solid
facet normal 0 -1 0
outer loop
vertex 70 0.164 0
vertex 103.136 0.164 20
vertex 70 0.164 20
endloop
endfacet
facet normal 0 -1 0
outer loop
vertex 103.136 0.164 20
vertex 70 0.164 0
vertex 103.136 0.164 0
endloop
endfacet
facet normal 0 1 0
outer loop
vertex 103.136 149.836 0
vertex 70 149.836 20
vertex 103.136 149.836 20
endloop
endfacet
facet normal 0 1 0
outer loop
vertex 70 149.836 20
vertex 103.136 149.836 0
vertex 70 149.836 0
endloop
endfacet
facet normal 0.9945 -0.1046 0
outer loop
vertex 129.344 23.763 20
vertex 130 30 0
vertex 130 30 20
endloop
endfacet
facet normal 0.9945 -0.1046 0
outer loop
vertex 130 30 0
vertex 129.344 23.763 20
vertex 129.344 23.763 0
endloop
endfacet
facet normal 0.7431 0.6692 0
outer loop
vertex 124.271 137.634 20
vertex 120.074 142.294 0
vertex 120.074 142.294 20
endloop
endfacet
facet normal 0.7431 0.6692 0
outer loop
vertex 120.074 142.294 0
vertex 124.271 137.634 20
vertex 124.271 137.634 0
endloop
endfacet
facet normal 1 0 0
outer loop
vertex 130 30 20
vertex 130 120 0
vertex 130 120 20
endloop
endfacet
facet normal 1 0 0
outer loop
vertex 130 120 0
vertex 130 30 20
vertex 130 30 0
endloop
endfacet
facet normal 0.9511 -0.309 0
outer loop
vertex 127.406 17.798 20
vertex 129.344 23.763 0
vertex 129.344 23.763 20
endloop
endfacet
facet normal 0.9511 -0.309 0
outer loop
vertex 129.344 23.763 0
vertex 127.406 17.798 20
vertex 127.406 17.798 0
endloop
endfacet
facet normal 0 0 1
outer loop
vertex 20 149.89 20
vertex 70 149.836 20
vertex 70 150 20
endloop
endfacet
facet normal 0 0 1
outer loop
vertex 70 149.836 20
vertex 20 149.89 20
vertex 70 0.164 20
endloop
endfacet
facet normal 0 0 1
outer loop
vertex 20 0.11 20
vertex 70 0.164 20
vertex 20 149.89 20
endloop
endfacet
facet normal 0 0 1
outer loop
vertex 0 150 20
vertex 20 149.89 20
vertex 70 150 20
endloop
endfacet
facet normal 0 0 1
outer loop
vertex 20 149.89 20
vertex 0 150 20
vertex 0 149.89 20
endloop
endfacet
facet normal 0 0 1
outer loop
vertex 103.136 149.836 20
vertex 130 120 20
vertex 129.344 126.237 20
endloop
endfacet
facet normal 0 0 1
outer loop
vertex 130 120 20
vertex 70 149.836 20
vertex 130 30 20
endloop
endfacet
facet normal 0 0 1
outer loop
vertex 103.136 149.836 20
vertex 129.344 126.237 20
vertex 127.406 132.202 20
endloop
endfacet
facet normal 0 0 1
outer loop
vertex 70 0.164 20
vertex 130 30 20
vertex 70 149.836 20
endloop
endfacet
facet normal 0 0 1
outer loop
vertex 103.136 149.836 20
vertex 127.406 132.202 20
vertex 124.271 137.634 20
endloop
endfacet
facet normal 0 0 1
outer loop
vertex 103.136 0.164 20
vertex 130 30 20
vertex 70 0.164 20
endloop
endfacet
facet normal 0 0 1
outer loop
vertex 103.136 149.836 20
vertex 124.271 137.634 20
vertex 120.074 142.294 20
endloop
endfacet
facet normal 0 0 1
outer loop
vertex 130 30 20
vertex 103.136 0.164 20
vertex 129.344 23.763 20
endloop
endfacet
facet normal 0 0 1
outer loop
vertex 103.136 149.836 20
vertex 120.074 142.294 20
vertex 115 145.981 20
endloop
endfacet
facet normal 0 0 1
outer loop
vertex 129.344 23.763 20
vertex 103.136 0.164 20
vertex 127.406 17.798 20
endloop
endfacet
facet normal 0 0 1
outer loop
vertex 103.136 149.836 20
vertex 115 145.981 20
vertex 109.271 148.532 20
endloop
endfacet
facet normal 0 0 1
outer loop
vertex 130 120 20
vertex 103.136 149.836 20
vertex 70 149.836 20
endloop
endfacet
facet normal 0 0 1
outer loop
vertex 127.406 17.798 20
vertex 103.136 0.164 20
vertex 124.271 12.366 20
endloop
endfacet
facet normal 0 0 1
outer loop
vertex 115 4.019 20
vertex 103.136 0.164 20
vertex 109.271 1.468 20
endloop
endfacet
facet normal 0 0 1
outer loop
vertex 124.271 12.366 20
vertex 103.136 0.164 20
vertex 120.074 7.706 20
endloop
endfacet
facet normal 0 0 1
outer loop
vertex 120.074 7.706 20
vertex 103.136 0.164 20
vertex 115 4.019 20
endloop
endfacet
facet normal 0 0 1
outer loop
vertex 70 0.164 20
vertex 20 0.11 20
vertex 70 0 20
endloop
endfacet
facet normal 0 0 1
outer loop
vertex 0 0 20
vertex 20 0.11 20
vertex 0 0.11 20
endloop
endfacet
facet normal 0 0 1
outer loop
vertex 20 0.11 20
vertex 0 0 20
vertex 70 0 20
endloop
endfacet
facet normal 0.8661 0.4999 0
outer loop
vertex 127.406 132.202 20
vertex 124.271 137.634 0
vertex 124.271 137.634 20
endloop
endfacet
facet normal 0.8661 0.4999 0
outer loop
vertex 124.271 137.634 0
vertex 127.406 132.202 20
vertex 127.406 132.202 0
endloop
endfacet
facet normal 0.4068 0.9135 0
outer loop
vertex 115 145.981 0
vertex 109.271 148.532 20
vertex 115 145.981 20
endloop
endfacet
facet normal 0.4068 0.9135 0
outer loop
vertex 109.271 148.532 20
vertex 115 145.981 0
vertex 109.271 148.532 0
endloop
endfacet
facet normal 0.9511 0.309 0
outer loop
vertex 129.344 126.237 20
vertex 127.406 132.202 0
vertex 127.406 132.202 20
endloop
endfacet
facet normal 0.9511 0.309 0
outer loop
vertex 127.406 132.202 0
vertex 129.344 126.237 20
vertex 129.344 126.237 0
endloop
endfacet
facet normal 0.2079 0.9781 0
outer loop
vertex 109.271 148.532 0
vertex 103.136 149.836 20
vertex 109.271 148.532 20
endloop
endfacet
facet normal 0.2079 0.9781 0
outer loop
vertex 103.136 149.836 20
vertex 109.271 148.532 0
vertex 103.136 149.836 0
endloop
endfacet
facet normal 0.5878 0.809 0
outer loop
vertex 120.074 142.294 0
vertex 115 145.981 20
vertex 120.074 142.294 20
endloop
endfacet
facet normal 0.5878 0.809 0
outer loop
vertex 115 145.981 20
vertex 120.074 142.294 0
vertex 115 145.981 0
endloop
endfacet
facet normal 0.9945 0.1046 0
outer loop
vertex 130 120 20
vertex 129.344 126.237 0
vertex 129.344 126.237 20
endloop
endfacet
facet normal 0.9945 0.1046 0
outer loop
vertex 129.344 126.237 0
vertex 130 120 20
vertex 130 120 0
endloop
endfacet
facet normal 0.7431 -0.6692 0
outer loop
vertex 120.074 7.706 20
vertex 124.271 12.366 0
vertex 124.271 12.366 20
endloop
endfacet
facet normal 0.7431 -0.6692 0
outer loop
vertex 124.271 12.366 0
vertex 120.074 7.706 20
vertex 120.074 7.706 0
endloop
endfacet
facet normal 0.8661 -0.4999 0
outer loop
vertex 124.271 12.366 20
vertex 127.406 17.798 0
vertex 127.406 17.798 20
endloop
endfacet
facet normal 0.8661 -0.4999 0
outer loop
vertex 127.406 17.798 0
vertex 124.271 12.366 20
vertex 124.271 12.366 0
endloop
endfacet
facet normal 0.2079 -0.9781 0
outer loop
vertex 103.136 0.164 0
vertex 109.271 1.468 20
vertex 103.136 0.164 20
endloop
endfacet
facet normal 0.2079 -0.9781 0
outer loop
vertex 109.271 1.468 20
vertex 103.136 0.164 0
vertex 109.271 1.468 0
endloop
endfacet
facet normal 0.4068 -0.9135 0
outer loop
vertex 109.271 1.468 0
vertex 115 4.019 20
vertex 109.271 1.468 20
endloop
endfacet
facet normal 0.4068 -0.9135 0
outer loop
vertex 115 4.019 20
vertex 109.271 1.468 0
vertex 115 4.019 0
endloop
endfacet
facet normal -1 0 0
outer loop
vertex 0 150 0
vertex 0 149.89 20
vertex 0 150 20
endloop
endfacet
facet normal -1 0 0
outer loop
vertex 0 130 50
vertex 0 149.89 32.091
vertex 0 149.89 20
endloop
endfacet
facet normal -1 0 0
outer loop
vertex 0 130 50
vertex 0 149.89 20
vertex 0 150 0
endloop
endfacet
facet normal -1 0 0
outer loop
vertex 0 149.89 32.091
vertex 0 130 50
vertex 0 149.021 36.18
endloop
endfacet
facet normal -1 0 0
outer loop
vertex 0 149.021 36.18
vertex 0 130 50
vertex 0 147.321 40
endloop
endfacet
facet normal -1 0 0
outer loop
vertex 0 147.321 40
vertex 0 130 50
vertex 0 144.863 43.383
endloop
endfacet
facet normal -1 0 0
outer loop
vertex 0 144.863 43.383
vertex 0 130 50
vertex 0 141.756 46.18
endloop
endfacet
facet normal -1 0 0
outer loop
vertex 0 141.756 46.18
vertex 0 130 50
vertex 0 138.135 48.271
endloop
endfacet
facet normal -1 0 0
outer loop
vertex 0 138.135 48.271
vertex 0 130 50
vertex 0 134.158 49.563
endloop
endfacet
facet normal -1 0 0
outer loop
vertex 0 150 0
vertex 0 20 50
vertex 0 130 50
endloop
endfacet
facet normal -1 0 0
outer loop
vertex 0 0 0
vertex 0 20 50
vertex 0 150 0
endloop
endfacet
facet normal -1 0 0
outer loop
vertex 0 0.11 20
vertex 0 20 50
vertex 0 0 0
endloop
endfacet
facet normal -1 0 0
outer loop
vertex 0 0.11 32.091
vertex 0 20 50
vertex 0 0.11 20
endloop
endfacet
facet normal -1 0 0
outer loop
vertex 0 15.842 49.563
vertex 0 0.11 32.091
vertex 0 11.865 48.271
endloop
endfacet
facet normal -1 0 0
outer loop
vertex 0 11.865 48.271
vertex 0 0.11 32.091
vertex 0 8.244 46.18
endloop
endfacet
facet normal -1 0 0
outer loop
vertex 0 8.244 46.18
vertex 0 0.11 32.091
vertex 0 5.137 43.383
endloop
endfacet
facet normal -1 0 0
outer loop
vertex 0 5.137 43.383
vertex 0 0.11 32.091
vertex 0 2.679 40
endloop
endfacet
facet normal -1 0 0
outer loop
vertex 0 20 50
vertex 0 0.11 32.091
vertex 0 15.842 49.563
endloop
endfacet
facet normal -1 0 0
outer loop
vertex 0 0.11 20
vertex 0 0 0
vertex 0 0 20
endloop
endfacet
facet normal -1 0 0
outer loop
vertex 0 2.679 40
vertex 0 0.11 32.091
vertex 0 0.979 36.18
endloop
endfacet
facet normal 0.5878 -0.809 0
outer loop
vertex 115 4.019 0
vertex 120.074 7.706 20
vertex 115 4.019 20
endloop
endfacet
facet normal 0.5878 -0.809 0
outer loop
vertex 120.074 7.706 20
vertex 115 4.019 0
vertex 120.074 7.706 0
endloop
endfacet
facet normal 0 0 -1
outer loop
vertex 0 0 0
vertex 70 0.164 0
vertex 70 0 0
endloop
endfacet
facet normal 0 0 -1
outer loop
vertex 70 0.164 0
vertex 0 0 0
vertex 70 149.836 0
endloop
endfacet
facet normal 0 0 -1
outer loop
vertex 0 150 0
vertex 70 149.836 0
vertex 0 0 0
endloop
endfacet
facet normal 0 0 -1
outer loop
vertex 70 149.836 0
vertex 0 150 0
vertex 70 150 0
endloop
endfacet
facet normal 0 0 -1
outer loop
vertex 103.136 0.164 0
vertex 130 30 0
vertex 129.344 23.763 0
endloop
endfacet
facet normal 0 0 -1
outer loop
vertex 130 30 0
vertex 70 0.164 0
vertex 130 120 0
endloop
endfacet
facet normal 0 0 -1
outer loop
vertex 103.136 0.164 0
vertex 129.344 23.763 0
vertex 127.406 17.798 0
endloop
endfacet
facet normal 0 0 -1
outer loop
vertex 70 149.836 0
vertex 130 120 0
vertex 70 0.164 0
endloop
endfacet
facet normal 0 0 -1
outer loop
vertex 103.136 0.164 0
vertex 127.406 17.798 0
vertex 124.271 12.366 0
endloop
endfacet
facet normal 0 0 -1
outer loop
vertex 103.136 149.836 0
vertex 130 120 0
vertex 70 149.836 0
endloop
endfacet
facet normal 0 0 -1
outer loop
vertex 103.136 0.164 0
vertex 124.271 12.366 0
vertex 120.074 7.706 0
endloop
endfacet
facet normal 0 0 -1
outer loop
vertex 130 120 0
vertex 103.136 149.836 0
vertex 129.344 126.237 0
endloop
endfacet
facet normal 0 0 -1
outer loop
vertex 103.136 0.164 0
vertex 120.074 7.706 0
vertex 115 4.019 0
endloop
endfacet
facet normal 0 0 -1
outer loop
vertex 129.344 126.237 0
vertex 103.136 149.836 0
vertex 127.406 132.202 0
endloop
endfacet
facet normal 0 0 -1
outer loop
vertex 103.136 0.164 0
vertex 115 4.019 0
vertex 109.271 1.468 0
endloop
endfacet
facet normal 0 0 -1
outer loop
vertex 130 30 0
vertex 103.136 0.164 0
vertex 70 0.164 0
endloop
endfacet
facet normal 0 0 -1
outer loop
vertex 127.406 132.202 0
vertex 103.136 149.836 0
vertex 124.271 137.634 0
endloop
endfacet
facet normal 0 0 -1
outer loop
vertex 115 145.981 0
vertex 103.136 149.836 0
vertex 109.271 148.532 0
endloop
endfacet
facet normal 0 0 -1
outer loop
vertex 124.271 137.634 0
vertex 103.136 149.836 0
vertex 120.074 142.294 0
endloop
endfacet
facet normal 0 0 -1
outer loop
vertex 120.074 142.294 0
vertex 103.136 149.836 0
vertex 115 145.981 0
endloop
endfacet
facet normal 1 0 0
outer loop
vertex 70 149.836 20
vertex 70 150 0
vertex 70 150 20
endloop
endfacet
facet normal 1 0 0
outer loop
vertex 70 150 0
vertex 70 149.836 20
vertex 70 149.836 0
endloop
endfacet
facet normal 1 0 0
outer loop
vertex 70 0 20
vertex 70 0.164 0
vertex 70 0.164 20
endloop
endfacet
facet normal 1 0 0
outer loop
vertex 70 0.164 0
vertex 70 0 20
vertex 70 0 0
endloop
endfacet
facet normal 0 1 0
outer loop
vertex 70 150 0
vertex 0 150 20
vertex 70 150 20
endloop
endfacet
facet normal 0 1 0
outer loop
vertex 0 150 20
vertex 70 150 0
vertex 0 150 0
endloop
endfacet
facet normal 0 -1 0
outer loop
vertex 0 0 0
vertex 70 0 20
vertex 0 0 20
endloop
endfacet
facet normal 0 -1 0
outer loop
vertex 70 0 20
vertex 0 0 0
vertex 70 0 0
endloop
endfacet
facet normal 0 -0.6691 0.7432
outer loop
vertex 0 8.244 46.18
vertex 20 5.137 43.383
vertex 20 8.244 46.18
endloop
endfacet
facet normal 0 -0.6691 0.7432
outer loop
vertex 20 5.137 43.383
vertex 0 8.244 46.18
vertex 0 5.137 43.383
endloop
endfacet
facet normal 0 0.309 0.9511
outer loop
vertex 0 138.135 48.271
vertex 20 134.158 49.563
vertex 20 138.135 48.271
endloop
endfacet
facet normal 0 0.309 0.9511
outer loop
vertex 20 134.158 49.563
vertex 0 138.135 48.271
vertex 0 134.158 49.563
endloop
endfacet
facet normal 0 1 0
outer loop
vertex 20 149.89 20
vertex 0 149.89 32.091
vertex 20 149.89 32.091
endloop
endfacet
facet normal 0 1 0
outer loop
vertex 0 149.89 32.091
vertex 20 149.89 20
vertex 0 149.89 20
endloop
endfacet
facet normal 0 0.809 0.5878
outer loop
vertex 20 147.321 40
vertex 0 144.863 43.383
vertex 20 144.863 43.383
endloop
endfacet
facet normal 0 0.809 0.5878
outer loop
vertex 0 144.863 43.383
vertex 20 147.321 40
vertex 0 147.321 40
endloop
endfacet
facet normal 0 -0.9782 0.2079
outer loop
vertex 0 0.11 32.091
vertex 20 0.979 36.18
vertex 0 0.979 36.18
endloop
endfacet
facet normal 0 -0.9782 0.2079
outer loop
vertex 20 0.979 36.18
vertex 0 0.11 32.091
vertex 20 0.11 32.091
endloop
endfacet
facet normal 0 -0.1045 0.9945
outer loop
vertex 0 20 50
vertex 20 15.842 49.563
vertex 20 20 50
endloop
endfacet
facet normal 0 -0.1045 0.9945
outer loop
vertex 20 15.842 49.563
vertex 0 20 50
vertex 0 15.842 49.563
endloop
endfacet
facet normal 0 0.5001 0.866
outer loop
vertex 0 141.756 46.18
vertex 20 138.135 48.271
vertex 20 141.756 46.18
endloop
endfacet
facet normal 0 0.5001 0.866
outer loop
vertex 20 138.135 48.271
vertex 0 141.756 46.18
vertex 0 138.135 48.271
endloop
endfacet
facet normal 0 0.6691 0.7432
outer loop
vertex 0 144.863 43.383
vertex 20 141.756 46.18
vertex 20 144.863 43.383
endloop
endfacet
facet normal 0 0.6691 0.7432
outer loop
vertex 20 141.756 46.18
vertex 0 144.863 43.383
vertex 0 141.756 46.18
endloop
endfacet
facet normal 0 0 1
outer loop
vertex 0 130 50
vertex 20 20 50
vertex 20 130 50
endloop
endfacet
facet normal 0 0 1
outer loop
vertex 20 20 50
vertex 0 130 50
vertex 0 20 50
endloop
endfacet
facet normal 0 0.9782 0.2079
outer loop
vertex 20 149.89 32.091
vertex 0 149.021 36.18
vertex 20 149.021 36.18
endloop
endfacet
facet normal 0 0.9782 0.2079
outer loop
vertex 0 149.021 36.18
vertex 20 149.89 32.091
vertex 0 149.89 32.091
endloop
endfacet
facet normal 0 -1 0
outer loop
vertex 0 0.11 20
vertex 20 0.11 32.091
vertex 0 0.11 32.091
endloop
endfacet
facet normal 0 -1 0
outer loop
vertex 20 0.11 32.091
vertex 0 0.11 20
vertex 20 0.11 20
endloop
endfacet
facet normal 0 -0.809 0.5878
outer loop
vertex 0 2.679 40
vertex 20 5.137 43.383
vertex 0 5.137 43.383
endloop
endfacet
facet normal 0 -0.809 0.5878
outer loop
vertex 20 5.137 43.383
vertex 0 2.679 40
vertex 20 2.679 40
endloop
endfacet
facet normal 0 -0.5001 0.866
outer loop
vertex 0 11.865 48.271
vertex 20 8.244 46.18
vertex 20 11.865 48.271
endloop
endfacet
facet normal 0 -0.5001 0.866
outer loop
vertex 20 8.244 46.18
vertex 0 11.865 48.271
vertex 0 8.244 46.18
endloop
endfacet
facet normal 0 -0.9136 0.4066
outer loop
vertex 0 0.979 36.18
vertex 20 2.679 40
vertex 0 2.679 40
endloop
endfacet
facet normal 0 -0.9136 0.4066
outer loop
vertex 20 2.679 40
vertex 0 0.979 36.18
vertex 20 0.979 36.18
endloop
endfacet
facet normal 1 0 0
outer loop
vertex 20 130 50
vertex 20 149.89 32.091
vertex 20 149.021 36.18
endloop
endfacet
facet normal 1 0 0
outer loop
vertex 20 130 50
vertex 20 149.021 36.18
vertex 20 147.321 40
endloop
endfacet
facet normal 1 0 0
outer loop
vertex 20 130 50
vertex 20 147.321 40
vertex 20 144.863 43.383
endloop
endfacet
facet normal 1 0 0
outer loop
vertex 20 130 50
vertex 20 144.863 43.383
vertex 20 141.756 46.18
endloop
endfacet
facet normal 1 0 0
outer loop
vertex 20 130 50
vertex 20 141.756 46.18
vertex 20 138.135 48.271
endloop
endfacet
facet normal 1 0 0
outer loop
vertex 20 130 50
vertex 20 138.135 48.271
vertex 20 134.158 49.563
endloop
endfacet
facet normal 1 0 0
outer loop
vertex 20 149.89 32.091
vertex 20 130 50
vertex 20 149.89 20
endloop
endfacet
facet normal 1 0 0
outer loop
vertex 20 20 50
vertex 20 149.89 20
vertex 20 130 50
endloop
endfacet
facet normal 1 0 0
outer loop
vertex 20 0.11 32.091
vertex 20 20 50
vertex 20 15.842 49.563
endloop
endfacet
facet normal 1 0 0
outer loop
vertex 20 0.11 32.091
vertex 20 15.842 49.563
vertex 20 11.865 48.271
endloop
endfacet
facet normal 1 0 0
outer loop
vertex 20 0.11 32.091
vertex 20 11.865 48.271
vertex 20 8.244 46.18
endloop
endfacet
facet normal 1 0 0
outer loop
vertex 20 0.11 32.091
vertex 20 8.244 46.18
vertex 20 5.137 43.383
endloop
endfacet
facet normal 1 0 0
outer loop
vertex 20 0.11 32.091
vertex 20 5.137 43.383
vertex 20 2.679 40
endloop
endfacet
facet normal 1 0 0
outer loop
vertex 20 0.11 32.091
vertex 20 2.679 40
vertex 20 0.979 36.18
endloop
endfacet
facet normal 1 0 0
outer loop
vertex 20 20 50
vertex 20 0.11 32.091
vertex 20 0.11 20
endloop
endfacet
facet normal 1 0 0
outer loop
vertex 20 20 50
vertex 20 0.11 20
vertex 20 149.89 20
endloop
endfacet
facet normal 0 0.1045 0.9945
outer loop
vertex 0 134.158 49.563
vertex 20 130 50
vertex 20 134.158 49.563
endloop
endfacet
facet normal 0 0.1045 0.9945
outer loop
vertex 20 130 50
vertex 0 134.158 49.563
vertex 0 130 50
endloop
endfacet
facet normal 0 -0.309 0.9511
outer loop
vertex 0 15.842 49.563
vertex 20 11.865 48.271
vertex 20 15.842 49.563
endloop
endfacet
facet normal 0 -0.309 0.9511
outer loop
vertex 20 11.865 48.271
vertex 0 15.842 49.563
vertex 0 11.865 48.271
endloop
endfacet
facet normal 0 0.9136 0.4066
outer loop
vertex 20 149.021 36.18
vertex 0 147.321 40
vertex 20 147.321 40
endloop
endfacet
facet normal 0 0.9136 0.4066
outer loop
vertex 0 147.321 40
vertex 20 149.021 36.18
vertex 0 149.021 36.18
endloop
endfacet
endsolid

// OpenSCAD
module lado(x,y,z,R){
union(){
hull() {
    translate([R,R,0])
    cylinder(z,r=R);
    
    translate([x+R,R,0]) cylinder(z,r=R);
    translate([R,y+R,0]) cylinder(z,r=R);
    translate([x+R,y+R,0]) cylinder(z,r=R);
}
translate([0,0,0])
cube([x,y+2*R,z]);
}
}


xbase=70;
ybase=90;
zbase=20;
R1=30;
lado(xbase,ybase,zbase,R1);

xlado=10;
ylado=110;
zlado=20;
R2=20;
translate([zlado,0,0])
rotate([0,-90,0])
lado(xlado,ylado,zlado,R=20);

//    rotate([0,-90,0])
//    lado(100,120,20,10);
    
//translate([-30,-30,0])
//    
